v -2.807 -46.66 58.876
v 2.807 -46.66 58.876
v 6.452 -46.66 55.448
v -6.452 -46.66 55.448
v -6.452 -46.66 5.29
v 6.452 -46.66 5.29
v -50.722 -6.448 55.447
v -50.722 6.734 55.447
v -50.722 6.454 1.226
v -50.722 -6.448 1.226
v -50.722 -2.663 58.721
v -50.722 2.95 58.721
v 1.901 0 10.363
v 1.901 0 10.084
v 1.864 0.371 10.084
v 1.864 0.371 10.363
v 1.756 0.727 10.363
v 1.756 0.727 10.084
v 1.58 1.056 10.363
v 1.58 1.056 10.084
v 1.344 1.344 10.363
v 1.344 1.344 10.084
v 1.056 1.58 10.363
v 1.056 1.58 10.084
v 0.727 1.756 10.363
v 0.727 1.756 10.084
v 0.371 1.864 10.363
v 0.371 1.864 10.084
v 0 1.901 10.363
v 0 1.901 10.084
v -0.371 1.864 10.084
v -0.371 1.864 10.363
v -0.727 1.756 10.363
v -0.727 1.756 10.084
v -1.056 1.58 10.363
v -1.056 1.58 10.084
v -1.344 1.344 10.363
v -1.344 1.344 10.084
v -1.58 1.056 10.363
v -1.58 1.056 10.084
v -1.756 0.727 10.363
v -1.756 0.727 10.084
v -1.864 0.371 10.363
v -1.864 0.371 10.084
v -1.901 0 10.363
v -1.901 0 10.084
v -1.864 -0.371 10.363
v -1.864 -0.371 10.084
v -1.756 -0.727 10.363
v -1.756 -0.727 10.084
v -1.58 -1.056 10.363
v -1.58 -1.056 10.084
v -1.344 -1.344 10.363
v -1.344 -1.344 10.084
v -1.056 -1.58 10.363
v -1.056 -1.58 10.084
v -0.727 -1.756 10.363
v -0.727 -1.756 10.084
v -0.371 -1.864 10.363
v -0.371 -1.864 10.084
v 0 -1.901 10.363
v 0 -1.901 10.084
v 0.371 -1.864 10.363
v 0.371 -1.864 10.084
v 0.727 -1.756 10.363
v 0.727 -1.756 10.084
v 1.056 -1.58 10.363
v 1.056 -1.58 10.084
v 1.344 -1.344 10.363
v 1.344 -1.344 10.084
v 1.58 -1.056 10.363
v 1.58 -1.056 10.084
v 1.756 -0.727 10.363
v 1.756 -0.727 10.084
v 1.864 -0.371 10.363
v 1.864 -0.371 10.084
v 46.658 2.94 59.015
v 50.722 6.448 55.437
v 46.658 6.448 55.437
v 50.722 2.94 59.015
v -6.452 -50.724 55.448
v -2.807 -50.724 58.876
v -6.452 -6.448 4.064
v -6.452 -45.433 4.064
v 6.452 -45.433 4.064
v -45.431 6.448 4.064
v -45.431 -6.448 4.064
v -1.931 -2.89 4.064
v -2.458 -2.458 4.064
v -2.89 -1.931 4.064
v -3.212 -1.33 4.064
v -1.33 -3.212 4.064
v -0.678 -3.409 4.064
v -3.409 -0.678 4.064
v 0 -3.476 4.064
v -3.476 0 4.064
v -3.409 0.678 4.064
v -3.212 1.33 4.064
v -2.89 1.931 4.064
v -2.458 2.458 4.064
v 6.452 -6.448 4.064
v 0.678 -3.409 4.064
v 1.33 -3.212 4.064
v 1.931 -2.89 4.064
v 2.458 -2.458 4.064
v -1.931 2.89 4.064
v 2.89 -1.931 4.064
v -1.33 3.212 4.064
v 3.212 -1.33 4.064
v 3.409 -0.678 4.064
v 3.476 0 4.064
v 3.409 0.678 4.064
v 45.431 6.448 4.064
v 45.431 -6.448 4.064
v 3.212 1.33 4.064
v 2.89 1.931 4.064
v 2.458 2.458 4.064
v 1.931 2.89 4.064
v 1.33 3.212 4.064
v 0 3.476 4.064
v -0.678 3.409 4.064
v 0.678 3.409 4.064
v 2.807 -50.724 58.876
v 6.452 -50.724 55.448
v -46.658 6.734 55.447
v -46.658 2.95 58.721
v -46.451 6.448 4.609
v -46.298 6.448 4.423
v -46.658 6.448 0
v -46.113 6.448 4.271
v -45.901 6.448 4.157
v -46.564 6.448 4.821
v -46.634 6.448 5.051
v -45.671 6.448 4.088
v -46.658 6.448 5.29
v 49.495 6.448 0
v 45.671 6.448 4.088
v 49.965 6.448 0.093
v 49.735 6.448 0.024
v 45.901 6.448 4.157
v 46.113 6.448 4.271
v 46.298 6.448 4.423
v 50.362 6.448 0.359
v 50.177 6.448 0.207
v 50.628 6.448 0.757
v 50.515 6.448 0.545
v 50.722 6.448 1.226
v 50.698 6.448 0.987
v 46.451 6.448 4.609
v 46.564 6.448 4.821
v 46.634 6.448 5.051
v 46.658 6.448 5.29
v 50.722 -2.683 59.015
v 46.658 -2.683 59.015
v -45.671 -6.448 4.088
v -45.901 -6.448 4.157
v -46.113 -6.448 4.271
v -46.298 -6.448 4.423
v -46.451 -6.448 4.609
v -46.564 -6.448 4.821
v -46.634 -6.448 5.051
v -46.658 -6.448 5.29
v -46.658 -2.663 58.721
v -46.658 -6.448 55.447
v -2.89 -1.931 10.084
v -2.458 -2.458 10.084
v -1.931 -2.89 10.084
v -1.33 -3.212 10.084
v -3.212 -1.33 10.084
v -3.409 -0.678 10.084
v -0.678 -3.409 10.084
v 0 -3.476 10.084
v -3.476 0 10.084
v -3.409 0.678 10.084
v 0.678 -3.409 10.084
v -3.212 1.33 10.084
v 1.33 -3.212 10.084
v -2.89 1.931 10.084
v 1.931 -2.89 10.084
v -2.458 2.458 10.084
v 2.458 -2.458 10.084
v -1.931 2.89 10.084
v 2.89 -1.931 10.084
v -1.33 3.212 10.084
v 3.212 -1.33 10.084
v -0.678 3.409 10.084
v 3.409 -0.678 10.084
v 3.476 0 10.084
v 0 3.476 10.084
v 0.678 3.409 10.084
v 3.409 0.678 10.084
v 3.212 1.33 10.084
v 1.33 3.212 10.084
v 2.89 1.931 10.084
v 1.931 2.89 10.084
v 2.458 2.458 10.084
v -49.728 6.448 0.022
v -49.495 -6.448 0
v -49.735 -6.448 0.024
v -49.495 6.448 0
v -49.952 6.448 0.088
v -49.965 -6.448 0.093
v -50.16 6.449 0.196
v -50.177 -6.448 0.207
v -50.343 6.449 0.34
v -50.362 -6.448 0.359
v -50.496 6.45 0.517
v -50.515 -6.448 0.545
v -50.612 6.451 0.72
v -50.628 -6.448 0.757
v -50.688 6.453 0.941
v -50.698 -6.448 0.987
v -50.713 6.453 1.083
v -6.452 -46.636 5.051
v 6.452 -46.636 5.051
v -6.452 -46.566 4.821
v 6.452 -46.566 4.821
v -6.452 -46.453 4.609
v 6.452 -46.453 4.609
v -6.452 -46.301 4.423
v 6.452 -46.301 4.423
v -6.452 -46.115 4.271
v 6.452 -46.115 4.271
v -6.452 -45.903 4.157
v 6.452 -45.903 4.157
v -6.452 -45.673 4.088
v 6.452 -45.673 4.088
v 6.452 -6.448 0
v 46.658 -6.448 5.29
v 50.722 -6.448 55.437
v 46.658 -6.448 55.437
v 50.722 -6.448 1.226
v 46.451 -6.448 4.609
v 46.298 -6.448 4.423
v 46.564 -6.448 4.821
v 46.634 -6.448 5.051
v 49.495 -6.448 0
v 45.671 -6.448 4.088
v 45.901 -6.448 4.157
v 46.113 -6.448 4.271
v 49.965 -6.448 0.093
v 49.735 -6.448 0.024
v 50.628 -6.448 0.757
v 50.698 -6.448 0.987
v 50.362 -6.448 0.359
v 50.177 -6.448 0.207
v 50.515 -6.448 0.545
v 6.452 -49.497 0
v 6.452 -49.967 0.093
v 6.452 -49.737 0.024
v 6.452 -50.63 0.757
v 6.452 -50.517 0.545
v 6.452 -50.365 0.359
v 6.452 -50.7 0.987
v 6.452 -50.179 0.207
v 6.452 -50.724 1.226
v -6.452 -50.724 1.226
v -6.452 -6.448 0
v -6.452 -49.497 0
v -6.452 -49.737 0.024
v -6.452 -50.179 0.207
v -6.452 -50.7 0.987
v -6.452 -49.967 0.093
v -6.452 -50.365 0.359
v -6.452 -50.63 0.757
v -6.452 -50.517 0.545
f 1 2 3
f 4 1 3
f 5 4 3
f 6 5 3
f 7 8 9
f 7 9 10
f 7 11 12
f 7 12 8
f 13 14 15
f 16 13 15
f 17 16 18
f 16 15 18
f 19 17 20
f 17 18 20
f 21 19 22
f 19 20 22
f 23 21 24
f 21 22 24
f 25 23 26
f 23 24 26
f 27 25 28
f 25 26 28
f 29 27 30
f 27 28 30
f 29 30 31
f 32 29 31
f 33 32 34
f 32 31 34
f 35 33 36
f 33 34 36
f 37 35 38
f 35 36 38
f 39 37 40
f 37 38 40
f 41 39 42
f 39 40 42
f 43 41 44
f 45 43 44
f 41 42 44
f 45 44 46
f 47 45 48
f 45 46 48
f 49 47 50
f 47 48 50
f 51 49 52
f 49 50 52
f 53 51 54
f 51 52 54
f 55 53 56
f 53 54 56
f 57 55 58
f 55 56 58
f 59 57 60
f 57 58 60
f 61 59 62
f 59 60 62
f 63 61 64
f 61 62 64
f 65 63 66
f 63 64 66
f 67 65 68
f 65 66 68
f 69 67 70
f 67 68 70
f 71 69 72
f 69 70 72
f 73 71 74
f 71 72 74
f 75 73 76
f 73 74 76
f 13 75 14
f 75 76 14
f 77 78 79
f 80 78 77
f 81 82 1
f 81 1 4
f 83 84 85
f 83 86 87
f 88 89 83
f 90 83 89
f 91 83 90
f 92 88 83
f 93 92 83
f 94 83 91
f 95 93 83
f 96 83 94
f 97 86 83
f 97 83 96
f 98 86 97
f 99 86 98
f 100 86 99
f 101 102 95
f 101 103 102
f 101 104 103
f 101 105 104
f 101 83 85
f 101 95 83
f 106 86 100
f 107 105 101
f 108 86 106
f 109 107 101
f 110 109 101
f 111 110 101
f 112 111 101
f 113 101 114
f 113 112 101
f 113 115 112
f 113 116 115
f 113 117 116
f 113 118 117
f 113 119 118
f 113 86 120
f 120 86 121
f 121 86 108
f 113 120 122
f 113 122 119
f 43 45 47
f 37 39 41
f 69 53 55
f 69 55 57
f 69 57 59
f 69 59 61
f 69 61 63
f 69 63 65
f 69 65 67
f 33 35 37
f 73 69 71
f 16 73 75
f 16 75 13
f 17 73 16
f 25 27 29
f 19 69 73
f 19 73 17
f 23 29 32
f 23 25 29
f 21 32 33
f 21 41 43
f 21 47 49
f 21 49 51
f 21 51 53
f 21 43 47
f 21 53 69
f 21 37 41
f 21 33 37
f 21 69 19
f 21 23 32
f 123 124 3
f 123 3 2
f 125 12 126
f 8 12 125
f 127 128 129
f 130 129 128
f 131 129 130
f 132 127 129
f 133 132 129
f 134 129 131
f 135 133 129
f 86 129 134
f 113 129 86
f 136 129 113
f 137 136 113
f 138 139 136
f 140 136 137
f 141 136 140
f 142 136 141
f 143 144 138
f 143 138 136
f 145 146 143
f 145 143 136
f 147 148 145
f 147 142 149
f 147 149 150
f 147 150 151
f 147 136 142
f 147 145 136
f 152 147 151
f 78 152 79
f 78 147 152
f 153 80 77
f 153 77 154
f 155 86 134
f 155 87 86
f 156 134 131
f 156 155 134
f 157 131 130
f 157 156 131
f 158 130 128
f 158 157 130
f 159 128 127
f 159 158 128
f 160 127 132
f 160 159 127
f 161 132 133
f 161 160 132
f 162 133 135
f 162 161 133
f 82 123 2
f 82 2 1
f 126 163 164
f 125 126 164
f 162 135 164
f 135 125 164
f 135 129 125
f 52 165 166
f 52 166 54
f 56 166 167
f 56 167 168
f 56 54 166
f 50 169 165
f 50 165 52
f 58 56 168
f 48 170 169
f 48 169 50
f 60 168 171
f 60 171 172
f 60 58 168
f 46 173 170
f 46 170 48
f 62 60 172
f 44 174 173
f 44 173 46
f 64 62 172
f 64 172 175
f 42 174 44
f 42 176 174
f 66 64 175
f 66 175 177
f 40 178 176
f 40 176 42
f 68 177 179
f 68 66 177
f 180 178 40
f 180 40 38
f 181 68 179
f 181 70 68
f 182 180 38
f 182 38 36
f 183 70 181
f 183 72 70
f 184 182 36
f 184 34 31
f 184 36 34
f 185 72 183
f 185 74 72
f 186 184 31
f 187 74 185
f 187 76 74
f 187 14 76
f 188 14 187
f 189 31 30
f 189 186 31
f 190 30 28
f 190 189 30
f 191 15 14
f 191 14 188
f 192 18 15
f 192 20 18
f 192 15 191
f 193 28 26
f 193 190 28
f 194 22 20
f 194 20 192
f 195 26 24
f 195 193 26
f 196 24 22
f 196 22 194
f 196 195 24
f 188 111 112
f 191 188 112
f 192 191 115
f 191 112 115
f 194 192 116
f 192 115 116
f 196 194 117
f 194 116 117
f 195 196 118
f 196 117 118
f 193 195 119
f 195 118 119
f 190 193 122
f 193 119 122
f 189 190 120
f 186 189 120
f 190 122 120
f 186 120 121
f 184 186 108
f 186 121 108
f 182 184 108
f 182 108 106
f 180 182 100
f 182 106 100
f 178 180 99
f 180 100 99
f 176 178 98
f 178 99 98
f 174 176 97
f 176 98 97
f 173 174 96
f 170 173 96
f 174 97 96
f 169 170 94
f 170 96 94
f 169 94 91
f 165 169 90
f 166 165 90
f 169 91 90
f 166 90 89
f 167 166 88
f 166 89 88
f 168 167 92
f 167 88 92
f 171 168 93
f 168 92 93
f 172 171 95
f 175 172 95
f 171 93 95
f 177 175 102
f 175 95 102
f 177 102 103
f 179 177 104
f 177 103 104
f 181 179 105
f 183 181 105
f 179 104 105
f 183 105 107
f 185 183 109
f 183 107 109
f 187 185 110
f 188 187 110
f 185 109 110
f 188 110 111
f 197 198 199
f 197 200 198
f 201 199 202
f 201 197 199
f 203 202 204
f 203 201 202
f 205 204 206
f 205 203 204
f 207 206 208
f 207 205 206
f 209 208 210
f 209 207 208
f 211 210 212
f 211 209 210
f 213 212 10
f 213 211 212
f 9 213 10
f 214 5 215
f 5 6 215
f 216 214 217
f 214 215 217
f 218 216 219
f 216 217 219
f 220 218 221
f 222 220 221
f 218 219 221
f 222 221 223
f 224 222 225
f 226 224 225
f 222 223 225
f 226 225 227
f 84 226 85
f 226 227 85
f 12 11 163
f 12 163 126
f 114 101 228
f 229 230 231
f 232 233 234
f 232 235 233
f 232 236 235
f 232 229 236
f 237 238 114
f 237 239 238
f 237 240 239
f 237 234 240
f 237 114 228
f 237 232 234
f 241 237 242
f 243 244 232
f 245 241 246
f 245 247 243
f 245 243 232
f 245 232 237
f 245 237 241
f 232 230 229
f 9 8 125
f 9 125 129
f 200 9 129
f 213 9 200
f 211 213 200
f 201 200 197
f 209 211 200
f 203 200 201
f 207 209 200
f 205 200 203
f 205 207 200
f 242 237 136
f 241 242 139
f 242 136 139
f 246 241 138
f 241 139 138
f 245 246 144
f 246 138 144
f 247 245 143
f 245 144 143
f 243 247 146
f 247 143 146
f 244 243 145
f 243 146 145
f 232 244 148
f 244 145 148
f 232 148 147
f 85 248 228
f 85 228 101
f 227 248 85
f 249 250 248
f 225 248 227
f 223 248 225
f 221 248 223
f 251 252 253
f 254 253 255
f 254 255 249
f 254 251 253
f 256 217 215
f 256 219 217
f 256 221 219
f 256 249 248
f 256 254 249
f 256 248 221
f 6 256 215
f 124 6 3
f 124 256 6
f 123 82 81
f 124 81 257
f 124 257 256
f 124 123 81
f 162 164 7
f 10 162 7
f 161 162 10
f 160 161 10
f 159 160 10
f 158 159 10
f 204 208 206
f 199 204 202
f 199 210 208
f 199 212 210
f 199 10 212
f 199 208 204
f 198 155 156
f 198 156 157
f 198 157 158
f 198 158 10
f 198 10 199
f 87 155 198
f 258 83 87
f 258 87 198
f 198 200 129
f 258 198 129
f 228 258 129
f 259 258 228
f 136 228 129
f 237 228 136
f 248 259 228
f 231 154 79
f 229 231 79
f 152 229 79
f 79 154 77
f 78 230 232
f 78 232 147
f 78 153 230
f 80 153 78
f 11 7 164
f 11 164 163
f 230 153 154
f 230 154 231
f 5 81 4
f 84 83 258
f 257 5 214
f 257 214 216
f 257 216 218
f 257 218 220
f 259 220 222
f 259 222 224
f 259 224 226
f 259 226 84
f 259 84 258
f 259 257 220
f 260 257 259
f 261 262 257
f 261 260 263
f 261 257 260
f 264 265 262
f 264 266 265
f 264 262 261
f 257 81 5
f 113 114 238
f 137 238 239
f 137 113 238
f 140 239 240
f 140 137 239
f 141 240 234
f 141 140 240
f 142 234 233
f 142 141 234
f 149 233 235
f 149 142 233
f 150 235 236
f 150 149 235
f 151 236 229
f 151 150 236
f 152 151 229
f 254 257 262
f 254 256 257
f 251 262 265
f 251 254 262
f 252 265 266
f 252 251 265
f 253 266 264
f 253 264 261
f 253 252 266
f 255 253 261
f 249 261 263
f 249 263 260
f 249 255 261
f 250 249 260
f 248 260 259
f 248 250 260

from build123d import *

# Parameters (mm, degrees)
F0_W      = 101.443342
F0_H      = 12.895348
F1_DEPTH  = 4.064
F2_W      = 12.895348
F2_H      = 4.064
F3_DEPTH  = 4.064
F4_W      = 12.895348
F4_H      = 4.064
F5_DEPTH  = 4.064
F6_W      = 12.9032
F6_H      = 44.474205
F7_DEPTH  = 4.064
F8_W      = 12.9032
F8_H      = 4.064
F9_DEPTH  = 4.064
F10_R     = 3.476261
F11_DEPTH = 6.0198
F12_R     = 1.22642
F13_R     = 1.900656
F14_DEPTH = 0.2794


with BuildPart() as f1:
    # F0 (on Top) → F1 (new body)
    with BuildSketch(Plane.XY):
        Rectangle(F0_W, F0_H)
    extrude(amount=F1_DEPTH)

    # F2 (on face) → F3 (join)
    with BuildSketch(Plane.YZ.offset(50.721671)):
        Polygon((-6.447674, 55.437263), (-6.447674, 4.064), (6.447674, 4.064), (6.447674, 55.437263), (2.940099, 59.015486), (-2.682819, 59.015486), align=None)
        with Locations((0, 2.032)):
            Rectangle(F2_W, F2_H)
    extrude(amount=-F3_DEPTH)

    # F4 (on face) → F5 (join)
    with BuildSketch(Plane(origin=(-50.721671, 0, 0), x_dir=(0, -1, 0), z_dir=(-1, 0, 0))):
        Polygon((-6.734233, 55.44746), (-6.447674, 0), (-6.447674, 4.064), (6.447674, 4.064), (6.447674, 55.44746), (2.663421, 58.72121), (-2.949979, 58.72121), align=None)
        with Locations((0, 2.032)):
            Rectangle(F4_W, F4_H)
    extrude(amount=-F5_DEPTH)

    # F6 (on Top) → F7 (join)
    with BuildSketch(Plane.XY):
        with Locations((0, -28.486697)):
            Rectangle(F6_W, F6_H)
    extrude(amount=F7_DEPTH)

    # F8 (on face) → F9 (join)
    with BuildSketch(Plane.XZ.offset(50.7238)):
        Polygon((-6.4516, 55.4482), (-6.4516, 4.064), (6.4516, 4.064), (6.4516, 55.4482), (2.8067, 58.876424), (-2.8067, 58.876424), align=None)
        with Locations((0, 2.032)):
            Rectangle(F8_W, F8_H)
    extrude(amount=-F9_DEPTH)

    # F10 (on face) → F11 (join)
    with BuildSketch(Plane.XY.offset(4.064)):
        Circle(F10_R)
    extrude(amount=F11_DEPTH)

    # F12
    f12_edges = [f1.edges().sort_by_distance(p)[0] for p in [
        (-46.657671, 0, 4.064),
        (46.657671, 0, 4.064),
        (50.721671, 0, 0),
        (-50.721671, 0, 0),
        (0, -50.7238, 0),
        (0, -46.6598, 4.064),
    ]]
    fillet(f12_edges, radius=F12_R)

    # F13 (on face) → F14 (join)
    with BuildSketch(Plane.XY.offset(10.0838)):
        Circle(F13_R)
    extrude(amount=F14_DEPTH)


solid = f1.part
